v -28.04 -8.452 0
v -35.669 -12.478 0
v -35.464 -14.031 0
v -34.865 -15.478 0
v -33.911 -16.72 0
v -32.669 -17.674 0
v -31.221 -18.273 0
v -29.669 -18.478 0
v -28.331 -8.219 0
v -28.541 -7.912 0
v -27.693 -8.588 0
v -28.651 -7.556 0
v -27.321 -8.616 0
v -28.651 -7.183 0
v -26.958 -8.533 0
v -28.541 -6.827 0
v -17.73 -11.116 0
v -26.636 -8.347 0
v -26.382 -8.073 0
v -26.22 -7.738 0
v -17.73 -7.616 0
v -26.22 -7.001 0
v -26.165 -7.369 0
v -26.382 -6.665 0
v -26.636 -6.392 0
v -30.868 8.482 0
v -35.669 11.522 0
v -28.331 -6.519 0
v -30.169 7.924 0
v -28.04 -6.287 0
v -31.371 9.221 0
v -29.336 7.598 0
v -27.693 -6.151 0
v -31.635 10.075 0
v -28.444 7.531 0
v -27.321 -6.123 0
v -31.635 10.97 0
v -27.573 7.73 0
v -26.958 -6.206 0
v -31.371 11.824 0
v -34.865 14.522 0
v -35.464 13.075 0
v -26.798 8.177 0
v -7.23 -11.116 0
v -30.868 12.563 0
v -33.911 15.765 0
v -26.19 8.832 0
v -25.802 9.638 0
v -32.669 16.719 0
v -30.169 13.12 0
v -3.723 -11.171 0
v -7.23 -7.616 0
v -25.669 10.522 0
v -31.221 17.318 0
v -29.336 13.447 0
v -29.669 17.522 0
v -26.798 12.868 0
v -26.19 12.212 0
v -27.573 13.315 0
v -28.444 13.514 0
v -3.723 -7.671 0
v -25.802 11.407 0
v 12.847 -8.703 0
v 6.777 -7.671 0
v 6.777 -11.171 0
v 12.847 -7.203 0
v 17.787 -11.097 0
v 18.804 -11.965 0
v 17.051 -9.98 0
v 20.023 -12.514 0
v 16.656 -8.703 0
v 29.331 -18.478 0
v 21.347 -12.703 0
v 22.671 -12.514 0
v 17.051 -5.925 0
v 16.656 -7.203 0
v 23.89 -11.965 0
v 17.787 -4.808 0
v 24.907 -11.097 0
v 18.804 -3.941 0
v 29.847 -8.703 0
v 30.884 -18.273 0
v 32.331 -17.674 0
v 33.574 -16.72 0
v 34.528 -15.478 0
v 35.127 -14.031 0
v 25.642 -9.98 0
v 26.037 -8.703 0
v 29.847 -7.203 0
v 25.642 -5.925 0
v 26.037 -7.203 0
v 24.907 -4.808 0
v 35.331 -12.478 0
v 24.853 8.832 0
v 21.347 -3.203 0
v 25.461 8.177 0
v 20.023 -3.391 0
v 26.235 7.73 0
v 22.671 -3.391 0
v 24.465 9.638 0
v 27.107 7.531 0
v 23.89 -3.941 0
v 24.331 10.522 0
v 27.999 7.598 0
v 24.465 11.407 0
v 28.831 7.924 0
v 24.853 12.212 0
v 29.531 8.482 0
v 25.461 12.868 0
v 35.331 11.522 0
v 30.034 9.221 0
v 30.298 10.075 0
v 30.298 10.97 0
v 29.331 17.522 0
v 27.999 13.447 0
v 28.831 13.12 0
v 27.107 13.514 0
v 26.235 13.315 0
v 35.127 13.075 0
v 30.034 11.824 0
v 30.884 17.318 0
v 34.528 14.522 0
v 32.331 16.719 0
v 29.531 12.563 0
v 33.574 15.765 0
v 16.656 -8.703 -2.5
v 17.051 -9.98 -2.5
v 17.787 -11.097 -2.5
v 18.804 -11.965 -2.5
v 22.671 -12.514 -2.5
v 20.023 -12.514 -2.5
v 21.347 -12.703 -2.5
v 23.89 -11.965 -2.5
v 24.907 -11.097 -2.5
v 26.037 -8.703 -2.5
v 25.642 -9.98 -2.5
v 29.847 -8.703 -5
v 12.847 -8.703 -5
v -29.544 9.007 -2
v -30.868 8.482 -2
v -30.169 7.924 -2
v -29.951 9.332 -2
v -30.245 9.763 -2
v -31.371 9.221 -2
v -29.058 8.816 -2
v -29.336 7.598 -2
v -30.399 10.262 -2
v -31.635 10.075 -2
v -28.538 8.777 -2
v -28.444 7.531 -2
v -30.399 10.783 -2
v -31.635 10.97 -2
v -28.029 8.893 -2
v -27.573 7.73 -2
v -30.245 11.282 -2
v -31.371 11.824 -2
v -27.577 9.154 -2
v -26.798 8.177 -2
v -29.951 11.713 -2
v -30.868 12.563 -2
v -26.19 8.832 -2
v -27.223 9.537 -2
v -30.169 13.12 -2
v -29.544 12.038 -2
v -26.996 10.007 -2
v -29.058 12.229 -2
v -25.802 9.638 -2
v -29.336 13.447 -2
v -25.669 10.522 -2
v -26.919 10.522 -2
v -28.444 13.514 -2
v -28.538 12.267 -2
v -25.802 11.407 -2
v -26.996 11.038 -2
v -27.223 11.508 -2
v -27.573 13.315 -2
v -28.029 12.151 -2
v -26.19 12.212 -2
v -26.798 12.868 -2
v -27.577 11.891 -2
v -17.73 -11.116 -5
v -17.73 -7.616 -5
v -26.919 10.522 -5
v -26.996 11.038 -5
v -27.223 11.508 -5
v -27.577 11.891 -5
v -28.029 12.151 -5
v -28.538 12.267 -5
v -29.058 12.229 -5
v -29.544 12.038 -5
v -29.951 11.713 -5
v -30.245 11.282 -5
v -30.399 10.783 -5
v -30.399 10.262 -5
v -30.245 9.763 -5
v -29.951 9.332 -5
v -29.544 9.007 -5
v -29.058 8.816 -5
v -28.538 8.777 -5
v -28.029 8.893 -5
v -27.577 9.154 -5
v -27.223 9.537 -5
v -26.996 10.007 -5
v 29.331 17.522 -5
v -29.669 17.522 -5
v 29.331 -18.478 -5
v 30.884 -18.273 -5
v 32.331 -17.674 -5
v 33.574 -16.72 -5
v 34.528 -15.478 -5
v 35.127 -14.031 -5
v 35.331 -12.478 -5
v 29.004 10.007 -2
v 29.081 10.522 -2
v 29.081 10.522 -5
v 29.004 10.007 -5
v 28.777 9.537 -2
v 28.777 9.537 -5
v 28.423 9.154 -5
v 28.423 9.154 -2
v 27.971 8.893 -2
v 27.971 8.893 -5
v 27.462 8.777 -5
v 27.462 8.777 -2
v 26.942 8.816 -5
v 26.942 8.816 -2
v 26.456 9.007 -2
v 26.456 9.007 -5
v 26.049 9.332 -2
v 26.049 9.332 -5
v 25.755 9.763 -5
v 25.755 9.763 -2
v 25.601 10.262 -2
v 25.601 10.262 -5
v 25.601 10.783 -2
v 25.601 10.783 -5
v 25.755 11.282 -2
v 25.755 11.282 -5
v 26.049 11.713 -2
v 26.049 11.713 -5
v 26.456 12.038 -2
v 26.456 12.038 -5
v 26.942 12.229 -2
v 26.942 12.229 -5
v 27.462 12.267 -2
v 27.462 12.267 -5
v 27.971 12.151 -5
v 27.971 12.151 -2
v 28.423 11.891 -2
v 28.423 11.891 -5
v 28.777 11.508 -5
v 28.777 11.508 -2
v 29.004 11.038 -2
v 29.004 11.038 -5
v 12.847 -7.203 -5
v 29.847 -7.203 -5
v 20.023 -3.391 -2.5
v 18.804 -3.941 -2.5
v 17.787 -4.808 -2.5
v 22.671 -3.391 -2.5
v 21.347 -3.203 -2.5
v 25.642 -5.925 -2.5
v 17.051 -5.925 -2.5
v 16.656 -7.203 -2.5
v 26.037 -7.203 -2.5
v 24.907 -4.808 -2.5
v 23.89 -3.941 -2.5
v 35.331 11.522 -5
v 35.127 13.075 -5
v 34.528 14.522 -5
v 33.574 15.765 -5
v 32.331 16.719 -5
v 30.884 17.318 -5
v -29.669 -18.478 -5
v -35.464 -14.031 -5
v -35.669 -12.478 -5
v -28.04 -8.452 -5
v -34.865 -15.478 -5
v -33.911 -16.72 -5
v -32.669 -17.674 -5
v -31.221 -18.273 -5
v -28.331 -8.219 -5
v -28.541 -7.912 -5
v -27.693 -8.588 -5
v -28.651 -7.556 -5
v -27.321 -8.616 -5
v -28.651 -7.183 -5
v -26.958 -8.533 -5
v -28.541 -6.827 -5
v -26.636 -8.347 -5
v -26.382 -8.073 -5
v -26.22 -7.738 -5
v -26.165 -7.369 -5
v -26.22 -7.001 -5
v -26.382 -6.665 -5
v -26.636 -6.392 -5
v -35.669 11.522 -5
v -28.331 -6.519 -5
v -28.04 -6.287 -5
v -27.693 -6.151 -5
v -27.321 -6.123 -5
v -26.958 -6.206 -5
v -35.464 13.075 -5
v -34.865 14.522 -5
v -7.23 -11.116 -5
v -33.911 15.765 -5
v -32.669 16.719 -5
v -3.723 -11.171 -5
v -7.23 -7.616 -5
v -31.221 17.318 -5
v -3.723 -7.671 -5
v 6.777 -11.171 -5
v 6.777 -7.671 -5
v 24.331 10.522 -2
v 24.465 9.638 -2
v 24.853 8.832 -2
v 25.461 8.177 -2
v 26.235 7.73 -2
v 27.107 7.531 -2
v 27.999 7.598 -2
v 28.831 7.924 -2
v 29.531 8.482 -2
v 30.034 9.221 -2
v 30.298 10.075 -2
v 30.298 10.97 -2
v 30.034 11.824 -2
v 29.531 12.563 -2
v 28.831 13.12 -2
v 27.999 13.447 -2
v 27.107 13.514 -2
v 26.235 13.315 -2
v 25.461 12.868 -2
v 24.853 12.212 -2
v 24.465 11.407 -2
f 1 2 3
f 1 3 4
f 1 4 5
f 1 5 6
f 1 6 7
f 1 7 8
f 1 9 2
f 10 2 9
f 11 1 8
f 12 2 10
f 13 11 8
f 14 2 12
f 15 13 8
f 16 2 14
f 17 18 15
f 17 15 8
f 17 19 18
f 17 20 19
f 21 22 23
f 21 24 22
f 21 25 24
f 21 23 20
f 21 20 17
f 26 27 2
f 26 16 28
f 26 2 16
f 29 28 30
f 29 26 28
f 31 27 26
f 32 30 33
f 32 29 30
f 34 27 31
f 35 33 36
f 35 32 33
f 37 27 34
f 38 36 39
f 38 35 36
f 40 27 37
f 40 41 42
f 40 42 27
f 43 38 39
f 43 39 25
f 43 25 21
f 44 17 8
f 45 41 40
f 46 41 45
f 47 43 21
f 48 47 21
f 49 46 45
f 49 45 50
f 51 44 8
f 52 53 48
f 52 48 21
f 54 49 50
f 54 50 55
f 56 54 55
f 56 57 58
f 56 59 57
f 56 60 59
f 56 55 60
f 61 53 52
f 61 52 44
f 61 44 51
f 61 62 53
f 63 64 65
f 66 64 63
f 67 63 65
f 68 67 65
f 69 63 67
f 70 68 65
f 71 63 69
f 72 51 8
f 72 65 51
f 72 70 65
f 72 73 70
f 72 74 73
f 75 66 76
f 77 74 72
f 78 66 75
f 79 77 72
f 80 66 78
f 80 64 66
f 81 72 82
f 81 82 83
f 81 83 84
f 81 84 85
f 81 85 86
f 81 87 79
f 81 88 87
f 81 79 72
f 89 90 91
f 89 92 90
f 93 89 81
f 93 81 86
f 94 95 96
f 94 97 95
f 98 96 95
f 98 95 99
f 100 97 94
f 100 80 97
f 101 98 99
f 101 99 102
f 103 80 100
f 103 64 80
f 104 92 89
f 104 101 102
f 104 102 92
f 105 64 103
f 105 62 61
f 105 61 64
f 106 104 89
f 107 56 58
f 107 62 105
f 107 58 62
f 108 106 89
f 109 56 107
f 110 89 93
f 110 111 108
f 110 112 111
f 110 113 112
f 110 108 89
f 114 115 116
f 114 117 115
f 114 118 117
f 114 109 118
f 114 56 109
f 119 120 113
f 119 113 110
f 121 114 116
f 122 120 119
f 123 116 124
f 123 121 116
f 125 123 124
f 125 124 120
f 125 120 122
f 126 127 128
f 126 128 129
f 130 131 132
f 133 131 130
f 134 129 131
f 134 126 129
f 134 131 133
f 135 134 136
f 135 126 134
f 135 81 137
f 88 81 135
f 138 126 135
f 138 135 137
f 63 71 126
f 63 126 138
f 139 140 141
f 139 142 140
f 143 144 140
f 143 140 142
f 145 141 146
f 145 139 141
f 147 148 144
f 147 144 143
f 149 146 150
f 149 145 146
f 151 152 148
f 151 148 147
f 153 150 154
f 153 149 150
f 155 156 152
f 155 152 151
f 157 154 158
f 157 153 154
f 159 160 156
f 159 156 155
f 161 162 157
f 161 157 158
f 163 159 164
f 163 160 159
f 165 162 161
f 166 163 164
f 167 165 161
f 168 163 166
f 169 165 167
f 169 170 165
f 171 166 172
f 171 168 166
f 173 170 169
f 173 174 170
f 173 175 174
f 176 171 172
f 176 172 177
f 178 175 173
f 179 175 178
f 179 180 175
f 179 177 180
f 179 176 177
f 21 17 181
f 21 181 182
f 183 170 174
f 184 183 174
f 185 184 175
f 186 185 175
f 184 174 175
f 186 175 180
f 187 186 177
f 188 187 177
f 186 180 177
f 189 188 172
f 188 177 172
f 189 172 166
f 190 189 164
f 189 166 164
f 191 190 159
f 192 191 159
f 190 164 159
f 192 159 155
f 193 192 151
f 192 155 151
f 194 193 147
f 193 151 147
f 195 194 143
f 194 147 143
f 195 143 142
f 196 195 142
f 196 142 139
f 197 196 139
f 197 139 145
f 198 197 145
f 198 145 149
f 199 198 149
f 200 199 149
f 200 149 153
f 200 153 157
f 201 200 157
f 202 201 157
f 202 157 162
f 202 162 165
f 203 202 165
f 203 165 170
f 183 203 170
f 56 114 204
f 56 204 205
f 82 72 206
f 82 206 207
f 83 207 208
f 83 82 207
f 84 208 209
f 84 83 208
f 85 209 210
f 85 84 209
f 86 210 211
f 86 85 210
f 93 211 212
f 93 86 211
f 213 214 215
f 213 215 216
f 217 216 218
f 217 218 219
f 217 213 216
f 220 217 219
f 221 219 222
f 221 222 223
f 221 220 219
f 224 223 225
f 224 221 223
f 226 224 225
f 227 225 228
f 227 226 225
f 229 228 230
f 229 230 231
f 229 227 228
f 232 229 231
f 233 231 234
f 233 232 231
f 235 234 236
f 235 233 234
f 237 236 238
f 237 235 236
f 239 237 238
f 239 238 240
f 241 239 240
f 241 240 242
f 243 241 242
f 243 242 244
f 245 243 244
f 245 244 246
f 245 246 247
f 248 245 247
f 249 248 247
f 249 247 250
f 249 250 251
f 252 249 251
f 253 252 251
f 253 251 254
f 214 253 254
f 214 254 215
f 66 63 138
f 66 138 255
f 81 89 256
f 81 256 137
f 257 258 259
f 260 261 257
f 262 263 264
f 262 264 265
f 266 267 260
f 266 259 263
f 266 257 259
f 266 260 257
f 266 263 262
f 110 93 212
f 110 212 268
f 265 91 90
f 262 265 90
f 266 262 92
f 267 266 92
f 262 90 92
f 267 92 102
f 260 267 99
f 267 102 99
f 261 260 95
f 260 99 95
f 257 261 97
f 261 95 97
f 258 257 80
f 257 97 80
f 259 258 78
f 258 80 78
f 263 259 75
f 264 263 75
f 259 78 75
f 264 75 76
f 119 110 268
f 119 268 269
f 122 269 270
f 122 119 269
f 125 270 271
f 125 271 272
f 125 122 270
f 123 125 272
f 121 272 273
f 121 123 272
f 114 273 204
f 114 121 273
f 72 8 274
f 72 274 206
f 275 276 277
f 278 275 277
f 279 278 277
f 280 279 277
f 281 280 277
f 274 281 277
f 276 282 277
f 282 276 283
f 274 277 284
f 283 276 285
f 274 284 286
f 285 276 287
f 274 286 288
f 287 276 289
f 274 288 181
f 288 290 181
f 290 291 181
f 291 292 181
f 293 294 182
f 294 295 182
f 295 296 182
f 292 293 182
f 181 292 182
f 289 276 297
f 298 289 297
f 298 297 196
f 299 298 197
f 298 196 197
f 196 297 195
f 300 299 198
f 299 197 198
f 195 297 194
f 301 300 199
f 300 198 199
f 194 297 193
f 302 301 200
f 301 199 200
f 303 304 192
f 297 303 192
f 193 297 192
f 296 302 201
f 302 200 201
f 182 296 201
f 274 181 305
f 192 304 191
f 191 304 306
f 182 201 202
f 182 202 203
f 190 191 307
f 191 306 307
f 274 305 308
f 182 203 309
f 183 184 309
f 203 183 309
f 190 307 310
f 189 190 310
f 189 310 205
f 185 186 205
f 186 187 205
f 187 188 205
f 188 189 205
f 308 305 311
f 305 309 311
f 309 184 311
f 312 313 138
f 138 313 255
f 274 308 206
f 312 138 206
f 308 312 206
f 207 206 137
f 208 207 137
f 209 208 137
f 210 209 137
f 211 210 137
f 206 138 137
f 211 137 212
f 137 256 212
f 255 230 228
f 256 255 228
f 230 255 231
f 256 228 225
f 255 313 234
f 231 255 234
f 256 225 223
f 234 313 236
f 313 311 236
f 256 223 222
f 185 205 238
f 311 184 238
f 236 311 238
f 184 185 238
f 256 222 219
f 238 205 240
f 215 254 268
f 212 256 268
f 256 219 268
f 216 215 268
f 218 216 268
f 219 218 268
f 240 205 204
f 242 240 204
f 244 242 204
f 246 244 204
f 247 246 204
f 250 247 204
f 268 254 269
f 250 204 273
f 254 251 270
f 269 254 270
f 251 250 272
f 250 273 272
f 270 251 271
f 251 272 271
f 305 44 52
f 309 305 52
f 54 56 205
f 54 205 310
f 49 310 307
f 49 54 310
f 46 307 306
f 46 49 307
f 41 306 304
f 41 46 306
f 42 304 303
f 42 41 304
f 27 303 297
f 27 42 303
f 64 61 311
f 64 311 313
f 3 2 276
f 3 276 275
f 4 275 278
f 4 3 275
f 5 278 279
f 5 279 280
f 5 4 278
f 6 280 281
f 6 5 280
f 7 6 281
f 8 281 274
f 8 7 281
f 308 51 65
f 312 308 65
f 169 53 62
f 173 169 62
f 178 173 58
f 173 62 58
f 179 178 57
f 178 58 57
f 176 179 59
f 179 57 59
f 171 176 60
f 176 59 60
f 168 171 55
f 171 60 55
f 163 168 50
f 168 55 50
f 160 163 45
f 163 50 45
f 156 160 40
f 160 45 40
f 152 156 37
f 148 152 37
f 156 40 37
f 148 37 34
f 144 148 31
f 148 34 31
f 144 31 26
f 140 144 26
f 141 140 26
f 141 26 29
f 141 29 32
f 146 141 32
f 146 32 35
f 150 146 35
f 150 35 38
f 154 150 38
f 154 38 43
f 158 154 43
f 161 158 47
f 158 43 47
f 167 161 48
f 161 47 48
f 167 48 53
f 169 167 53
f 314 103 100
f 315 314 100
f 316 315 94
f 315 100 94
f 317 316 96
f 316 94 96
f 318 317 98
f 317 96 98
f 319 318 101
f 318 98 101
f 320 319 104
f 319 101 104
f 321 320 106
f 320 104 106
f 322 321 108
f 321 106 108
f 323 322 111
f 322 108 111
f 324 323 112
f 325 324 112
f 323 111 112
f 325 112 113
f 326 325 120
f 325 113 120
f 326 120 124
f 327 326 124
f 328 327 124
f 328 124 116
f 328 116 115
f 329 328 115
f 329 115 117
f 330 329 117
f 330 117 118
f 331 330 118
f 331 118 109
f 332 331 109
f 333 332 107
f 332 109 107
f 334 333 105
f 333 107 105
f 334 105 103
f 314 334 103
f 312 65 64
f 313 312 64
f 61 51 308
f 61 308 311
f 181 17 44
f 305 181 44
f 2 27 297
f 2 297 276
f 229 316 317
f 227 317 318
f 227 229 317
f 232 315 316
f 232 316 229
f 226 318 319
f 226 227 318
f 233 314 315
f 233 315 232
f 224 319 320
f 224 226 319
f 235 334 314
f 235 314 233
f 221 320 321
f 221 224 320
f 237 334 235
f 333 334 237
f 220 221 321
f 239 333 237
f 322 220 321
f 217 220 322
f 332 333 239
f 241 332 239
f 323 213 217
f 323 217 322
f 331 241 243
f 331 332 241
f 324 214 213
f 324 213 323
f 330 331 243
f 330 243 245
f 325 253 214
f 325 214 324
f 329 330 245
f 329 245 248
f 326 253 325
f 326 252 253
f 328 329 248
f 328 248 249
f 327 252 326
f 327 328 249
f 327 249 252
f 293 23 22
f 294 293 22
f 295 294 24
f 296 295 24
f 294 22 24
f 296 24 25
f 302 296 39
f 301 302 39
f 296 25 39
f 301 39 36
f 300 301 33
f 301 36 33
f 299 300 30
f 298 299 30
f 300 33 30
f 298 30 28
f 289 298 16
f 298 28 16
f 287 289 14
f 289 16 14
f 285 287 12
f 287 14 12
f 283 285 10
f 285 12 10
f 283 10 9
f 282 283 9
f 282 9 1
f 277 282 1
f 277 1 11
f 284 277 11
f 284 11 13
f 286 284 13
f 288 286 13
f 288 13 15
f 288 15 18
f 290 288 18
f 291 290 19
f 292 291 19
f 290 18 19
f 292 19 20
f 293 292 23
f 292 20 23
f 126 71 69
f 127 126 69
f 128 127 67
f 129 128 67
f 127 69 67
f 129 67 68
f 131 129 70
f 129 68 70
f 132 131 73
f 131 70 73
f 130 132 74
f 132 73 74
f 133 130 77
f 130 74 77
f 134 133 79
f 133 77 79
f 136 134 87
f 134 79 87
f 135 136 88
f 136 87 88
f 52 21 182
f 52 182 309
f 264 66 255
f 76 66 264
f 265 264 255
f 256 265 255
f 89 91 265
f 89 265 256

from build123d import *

# Parameters (mm, degrees)
F0_R     = 1.25
F0_W     = 10.5
F0_H     = 3.5
F0_R_2   = 3
F0_R_3   = 1.75
F1_DEPTH = 5
F2_DEPTH = 2
F3_DEPTH = 2.5


with BuildPart() as f1:
    # F0 (on Top) → F1 (new body)
    with BuildSketch(Plane.XY):
        with BuildLine():
            Line((29.3314352036, 17.5223795399), (-29.6685647964, 17.5223795399))
            ThreePointArc((-29.6685647964, 17.5223795399), (-33.9112054836, 15.765020227), (-35.6685647964, 11.5223795399))
            Line((-35.6685647964, 11.5223795399), (-35.6685647964, -12.4776204601))
            ThreePointArc((-35.6685647964, -12.4776204601), (-33.9112054836, -16.7202611472), (-29.6685647964, -18.4776204601))
            Line((-29.6685647964, -18.4776204601), (29.3314352036, -18.4776204601))
            ThreePointArc((29.3314352036, -18.4776204601), (33.5740758907, -16.7202611472), (35.3314352036, -12.4776204601))
            Line((35.3314352036, -12.4776204601), (35.3314352036, 11.5223795399))
            ThreePointArc((35.3314352036, 11.5223795399), (33.5740758907, 15.765020227), (29.3314352036, 17.5223795399))
        make_face()
        with Locations((-27.4148993194, -7.3692747392)):
            Circle(F0_R, mode=Mode.SUBTRACT)
        with Locations((-12.4803110957, -9.3660038244)):
            Rectangle(F0_W, F0_H, mode=Mode.SUBTRACT)
        with Locations((1.526786318, -9.4208057884)):
            Rectangle(F0_W, F0_H, mode=Mode.SUBTRACT)
        with BuildLine():
            Line((12.8467483446, -8.7025752291), (12.8467483446, -7.2025752291))
            Line((12.8467483446, -7.2025752291), (16.6563325848, -7.2025752291))
            ThreePointArc((16.6563325848, -7.2025752291), (21.3467483446, -3.2025752291), (26.0371641044, -7.2025752291))
            Line((26.0371641044, -7.2025752291), (29.8467483446, -7.2025752291))
            Line((29.8467483446, -7.2025752291), (29.8467483446, -8.7025752291))
            Line((29.8467483446, -8.7025752291), (26.0371641044, -8.7025752291))
            ThreePointArc((26.0371641044, -8.7025752291), (21.3467483446, -12.7025752291), (16.6563325848, -8.7025752291))
            Line((16.6563325848, -8.7025752291), (12.8467483446, -8.7025752291))
        make_face(mode=Mode.SUBTRACT)
        with Locations((-28.6685647964, 10.5223795399)):
            Circle(F0_R_2, mode=Mode.SUBTRACT)
        with BuildLine():
            ThreePointArc((30.3314352036, 10.5223795399), (27.3314352036, 7.5223795399), (24.3314352036, 10.5223795399))
            ThreePointArc((24.3314352036, 10.5223795399), (27.3314352036, 13.5223795399), (30.3314352036, 10.5223795399))
        make_face(mode=Mode.SUBTRACT)
        with Locations((-28.6685647964, 10.5223795399)):
            Circle(F0_R_2)
        with Locations((-28.6685647964, 10.5223795399)):
            Circle(F0_R_3, mode=Mode.SUBTRACT)
        with BuildLine():
            Line((26.0371641044, -8.7025752291), (16.6563325848, -8.7025752291))
            ThreePointArc((16.6563325848, -8.7025752291), (21.3467483446, -12.7025752291), (26.0371641044, -8.7025752291))
        make_face()
        with BuildLine():
            ThreePointArc((26.0371641044, -7.2025752291), (21.3467483446, -3.2025752291), (16.6563325848, -7.2025752291))
            Line((16.6563325848, -7.2025752291), (26.0371641044, -7.2025752291))
        make_face()
        with BuildLine():
            ThreePointArc((30.3314352036, 10.5223795399), (27.3314352036, 13.5223795399), (24.3314352036, 10.5223795399))
            ThreePointArc((24.3314352036, 10.5223795399), (27.3314352036, 7.5223795399), (30.3314352036, 10.5223795399))
        make_face()
        with BuildLine():
            ThreePointArc((25.5814352036, 10.5223795399), (27.3314352036, 12.2723795399), (29.0814352036, 10.5223795399))
            ThreePointArc((29.0814352036, 10.5223795399), (27.3314352036, 8.7723795399), (25.5814352036, 10.5223795399))
        make_face(mode=Mode.SUBTRACT)
    extrude(amount=-F1_DEPTH)

    # F0 (on Top) → F2 (cut)
    with BuildSketch(Plane.XY):
        with Locations((-28.6685647964, 10.5223795399)):
            Circle(F0_R_2)
        with Locations((-28.6685647964, 10.5223795399)):
            Circle(F0_R_3, mode=Mode.SUBTRACT)
        with BuildLine():
            ThreePointArc((30.3314352036, 10.5223795399), (27.3314352036, 13.5223795399), (24.3314352036, 10.5223795399))
            ThreePointArc((24.3314352036, 10.5223795399), (27.3314352036, 7.5223795399), (30.3314352036, 10.5223795399))
        make_face()
        with BuildLine():
            ThreePointArc((25.5814352036, 10.5223795399), (27.3314352036, 12.2723795399), (29.0814352036, 10.5223795399))
            ThreePointArc((29.0814352036, 10.5223795399), (27.3314352036, 8.7723795399), (25.5814352036, 10.5223795399))
        make_face(mode=Mode.SUBTRACT)
    extrude(amount=-F2_DEPTH, mode=Mode.SUBTRACT)

    # F0 (on Top) → F3 (cut)
    with BuildSketch(Plane.XY):
        with BuildLine():
            Line((26.0371641044, -8.7025752291), (16.6563325848, -8.7025752291))
            ThreePointArc((16.6563325848, -8.7025752291), (21.3467483446, -12.7025752291), (26.0371641044, -8.7025752291))
        make_face()
        with BuildLine():
            ThreePointArc((26.0371641044, -7.2025752291), (21.3467483446, -3.2025752291), (16.6563325848, -7.2025752291))
            Line((16.6563325848, -7.2025752291), (26.0371641044, -7.2025752291))
        make_face()
    extrude(amount=-F3_DEPTH, mode=Mode.SUBTRACT)


solid = f1.part
